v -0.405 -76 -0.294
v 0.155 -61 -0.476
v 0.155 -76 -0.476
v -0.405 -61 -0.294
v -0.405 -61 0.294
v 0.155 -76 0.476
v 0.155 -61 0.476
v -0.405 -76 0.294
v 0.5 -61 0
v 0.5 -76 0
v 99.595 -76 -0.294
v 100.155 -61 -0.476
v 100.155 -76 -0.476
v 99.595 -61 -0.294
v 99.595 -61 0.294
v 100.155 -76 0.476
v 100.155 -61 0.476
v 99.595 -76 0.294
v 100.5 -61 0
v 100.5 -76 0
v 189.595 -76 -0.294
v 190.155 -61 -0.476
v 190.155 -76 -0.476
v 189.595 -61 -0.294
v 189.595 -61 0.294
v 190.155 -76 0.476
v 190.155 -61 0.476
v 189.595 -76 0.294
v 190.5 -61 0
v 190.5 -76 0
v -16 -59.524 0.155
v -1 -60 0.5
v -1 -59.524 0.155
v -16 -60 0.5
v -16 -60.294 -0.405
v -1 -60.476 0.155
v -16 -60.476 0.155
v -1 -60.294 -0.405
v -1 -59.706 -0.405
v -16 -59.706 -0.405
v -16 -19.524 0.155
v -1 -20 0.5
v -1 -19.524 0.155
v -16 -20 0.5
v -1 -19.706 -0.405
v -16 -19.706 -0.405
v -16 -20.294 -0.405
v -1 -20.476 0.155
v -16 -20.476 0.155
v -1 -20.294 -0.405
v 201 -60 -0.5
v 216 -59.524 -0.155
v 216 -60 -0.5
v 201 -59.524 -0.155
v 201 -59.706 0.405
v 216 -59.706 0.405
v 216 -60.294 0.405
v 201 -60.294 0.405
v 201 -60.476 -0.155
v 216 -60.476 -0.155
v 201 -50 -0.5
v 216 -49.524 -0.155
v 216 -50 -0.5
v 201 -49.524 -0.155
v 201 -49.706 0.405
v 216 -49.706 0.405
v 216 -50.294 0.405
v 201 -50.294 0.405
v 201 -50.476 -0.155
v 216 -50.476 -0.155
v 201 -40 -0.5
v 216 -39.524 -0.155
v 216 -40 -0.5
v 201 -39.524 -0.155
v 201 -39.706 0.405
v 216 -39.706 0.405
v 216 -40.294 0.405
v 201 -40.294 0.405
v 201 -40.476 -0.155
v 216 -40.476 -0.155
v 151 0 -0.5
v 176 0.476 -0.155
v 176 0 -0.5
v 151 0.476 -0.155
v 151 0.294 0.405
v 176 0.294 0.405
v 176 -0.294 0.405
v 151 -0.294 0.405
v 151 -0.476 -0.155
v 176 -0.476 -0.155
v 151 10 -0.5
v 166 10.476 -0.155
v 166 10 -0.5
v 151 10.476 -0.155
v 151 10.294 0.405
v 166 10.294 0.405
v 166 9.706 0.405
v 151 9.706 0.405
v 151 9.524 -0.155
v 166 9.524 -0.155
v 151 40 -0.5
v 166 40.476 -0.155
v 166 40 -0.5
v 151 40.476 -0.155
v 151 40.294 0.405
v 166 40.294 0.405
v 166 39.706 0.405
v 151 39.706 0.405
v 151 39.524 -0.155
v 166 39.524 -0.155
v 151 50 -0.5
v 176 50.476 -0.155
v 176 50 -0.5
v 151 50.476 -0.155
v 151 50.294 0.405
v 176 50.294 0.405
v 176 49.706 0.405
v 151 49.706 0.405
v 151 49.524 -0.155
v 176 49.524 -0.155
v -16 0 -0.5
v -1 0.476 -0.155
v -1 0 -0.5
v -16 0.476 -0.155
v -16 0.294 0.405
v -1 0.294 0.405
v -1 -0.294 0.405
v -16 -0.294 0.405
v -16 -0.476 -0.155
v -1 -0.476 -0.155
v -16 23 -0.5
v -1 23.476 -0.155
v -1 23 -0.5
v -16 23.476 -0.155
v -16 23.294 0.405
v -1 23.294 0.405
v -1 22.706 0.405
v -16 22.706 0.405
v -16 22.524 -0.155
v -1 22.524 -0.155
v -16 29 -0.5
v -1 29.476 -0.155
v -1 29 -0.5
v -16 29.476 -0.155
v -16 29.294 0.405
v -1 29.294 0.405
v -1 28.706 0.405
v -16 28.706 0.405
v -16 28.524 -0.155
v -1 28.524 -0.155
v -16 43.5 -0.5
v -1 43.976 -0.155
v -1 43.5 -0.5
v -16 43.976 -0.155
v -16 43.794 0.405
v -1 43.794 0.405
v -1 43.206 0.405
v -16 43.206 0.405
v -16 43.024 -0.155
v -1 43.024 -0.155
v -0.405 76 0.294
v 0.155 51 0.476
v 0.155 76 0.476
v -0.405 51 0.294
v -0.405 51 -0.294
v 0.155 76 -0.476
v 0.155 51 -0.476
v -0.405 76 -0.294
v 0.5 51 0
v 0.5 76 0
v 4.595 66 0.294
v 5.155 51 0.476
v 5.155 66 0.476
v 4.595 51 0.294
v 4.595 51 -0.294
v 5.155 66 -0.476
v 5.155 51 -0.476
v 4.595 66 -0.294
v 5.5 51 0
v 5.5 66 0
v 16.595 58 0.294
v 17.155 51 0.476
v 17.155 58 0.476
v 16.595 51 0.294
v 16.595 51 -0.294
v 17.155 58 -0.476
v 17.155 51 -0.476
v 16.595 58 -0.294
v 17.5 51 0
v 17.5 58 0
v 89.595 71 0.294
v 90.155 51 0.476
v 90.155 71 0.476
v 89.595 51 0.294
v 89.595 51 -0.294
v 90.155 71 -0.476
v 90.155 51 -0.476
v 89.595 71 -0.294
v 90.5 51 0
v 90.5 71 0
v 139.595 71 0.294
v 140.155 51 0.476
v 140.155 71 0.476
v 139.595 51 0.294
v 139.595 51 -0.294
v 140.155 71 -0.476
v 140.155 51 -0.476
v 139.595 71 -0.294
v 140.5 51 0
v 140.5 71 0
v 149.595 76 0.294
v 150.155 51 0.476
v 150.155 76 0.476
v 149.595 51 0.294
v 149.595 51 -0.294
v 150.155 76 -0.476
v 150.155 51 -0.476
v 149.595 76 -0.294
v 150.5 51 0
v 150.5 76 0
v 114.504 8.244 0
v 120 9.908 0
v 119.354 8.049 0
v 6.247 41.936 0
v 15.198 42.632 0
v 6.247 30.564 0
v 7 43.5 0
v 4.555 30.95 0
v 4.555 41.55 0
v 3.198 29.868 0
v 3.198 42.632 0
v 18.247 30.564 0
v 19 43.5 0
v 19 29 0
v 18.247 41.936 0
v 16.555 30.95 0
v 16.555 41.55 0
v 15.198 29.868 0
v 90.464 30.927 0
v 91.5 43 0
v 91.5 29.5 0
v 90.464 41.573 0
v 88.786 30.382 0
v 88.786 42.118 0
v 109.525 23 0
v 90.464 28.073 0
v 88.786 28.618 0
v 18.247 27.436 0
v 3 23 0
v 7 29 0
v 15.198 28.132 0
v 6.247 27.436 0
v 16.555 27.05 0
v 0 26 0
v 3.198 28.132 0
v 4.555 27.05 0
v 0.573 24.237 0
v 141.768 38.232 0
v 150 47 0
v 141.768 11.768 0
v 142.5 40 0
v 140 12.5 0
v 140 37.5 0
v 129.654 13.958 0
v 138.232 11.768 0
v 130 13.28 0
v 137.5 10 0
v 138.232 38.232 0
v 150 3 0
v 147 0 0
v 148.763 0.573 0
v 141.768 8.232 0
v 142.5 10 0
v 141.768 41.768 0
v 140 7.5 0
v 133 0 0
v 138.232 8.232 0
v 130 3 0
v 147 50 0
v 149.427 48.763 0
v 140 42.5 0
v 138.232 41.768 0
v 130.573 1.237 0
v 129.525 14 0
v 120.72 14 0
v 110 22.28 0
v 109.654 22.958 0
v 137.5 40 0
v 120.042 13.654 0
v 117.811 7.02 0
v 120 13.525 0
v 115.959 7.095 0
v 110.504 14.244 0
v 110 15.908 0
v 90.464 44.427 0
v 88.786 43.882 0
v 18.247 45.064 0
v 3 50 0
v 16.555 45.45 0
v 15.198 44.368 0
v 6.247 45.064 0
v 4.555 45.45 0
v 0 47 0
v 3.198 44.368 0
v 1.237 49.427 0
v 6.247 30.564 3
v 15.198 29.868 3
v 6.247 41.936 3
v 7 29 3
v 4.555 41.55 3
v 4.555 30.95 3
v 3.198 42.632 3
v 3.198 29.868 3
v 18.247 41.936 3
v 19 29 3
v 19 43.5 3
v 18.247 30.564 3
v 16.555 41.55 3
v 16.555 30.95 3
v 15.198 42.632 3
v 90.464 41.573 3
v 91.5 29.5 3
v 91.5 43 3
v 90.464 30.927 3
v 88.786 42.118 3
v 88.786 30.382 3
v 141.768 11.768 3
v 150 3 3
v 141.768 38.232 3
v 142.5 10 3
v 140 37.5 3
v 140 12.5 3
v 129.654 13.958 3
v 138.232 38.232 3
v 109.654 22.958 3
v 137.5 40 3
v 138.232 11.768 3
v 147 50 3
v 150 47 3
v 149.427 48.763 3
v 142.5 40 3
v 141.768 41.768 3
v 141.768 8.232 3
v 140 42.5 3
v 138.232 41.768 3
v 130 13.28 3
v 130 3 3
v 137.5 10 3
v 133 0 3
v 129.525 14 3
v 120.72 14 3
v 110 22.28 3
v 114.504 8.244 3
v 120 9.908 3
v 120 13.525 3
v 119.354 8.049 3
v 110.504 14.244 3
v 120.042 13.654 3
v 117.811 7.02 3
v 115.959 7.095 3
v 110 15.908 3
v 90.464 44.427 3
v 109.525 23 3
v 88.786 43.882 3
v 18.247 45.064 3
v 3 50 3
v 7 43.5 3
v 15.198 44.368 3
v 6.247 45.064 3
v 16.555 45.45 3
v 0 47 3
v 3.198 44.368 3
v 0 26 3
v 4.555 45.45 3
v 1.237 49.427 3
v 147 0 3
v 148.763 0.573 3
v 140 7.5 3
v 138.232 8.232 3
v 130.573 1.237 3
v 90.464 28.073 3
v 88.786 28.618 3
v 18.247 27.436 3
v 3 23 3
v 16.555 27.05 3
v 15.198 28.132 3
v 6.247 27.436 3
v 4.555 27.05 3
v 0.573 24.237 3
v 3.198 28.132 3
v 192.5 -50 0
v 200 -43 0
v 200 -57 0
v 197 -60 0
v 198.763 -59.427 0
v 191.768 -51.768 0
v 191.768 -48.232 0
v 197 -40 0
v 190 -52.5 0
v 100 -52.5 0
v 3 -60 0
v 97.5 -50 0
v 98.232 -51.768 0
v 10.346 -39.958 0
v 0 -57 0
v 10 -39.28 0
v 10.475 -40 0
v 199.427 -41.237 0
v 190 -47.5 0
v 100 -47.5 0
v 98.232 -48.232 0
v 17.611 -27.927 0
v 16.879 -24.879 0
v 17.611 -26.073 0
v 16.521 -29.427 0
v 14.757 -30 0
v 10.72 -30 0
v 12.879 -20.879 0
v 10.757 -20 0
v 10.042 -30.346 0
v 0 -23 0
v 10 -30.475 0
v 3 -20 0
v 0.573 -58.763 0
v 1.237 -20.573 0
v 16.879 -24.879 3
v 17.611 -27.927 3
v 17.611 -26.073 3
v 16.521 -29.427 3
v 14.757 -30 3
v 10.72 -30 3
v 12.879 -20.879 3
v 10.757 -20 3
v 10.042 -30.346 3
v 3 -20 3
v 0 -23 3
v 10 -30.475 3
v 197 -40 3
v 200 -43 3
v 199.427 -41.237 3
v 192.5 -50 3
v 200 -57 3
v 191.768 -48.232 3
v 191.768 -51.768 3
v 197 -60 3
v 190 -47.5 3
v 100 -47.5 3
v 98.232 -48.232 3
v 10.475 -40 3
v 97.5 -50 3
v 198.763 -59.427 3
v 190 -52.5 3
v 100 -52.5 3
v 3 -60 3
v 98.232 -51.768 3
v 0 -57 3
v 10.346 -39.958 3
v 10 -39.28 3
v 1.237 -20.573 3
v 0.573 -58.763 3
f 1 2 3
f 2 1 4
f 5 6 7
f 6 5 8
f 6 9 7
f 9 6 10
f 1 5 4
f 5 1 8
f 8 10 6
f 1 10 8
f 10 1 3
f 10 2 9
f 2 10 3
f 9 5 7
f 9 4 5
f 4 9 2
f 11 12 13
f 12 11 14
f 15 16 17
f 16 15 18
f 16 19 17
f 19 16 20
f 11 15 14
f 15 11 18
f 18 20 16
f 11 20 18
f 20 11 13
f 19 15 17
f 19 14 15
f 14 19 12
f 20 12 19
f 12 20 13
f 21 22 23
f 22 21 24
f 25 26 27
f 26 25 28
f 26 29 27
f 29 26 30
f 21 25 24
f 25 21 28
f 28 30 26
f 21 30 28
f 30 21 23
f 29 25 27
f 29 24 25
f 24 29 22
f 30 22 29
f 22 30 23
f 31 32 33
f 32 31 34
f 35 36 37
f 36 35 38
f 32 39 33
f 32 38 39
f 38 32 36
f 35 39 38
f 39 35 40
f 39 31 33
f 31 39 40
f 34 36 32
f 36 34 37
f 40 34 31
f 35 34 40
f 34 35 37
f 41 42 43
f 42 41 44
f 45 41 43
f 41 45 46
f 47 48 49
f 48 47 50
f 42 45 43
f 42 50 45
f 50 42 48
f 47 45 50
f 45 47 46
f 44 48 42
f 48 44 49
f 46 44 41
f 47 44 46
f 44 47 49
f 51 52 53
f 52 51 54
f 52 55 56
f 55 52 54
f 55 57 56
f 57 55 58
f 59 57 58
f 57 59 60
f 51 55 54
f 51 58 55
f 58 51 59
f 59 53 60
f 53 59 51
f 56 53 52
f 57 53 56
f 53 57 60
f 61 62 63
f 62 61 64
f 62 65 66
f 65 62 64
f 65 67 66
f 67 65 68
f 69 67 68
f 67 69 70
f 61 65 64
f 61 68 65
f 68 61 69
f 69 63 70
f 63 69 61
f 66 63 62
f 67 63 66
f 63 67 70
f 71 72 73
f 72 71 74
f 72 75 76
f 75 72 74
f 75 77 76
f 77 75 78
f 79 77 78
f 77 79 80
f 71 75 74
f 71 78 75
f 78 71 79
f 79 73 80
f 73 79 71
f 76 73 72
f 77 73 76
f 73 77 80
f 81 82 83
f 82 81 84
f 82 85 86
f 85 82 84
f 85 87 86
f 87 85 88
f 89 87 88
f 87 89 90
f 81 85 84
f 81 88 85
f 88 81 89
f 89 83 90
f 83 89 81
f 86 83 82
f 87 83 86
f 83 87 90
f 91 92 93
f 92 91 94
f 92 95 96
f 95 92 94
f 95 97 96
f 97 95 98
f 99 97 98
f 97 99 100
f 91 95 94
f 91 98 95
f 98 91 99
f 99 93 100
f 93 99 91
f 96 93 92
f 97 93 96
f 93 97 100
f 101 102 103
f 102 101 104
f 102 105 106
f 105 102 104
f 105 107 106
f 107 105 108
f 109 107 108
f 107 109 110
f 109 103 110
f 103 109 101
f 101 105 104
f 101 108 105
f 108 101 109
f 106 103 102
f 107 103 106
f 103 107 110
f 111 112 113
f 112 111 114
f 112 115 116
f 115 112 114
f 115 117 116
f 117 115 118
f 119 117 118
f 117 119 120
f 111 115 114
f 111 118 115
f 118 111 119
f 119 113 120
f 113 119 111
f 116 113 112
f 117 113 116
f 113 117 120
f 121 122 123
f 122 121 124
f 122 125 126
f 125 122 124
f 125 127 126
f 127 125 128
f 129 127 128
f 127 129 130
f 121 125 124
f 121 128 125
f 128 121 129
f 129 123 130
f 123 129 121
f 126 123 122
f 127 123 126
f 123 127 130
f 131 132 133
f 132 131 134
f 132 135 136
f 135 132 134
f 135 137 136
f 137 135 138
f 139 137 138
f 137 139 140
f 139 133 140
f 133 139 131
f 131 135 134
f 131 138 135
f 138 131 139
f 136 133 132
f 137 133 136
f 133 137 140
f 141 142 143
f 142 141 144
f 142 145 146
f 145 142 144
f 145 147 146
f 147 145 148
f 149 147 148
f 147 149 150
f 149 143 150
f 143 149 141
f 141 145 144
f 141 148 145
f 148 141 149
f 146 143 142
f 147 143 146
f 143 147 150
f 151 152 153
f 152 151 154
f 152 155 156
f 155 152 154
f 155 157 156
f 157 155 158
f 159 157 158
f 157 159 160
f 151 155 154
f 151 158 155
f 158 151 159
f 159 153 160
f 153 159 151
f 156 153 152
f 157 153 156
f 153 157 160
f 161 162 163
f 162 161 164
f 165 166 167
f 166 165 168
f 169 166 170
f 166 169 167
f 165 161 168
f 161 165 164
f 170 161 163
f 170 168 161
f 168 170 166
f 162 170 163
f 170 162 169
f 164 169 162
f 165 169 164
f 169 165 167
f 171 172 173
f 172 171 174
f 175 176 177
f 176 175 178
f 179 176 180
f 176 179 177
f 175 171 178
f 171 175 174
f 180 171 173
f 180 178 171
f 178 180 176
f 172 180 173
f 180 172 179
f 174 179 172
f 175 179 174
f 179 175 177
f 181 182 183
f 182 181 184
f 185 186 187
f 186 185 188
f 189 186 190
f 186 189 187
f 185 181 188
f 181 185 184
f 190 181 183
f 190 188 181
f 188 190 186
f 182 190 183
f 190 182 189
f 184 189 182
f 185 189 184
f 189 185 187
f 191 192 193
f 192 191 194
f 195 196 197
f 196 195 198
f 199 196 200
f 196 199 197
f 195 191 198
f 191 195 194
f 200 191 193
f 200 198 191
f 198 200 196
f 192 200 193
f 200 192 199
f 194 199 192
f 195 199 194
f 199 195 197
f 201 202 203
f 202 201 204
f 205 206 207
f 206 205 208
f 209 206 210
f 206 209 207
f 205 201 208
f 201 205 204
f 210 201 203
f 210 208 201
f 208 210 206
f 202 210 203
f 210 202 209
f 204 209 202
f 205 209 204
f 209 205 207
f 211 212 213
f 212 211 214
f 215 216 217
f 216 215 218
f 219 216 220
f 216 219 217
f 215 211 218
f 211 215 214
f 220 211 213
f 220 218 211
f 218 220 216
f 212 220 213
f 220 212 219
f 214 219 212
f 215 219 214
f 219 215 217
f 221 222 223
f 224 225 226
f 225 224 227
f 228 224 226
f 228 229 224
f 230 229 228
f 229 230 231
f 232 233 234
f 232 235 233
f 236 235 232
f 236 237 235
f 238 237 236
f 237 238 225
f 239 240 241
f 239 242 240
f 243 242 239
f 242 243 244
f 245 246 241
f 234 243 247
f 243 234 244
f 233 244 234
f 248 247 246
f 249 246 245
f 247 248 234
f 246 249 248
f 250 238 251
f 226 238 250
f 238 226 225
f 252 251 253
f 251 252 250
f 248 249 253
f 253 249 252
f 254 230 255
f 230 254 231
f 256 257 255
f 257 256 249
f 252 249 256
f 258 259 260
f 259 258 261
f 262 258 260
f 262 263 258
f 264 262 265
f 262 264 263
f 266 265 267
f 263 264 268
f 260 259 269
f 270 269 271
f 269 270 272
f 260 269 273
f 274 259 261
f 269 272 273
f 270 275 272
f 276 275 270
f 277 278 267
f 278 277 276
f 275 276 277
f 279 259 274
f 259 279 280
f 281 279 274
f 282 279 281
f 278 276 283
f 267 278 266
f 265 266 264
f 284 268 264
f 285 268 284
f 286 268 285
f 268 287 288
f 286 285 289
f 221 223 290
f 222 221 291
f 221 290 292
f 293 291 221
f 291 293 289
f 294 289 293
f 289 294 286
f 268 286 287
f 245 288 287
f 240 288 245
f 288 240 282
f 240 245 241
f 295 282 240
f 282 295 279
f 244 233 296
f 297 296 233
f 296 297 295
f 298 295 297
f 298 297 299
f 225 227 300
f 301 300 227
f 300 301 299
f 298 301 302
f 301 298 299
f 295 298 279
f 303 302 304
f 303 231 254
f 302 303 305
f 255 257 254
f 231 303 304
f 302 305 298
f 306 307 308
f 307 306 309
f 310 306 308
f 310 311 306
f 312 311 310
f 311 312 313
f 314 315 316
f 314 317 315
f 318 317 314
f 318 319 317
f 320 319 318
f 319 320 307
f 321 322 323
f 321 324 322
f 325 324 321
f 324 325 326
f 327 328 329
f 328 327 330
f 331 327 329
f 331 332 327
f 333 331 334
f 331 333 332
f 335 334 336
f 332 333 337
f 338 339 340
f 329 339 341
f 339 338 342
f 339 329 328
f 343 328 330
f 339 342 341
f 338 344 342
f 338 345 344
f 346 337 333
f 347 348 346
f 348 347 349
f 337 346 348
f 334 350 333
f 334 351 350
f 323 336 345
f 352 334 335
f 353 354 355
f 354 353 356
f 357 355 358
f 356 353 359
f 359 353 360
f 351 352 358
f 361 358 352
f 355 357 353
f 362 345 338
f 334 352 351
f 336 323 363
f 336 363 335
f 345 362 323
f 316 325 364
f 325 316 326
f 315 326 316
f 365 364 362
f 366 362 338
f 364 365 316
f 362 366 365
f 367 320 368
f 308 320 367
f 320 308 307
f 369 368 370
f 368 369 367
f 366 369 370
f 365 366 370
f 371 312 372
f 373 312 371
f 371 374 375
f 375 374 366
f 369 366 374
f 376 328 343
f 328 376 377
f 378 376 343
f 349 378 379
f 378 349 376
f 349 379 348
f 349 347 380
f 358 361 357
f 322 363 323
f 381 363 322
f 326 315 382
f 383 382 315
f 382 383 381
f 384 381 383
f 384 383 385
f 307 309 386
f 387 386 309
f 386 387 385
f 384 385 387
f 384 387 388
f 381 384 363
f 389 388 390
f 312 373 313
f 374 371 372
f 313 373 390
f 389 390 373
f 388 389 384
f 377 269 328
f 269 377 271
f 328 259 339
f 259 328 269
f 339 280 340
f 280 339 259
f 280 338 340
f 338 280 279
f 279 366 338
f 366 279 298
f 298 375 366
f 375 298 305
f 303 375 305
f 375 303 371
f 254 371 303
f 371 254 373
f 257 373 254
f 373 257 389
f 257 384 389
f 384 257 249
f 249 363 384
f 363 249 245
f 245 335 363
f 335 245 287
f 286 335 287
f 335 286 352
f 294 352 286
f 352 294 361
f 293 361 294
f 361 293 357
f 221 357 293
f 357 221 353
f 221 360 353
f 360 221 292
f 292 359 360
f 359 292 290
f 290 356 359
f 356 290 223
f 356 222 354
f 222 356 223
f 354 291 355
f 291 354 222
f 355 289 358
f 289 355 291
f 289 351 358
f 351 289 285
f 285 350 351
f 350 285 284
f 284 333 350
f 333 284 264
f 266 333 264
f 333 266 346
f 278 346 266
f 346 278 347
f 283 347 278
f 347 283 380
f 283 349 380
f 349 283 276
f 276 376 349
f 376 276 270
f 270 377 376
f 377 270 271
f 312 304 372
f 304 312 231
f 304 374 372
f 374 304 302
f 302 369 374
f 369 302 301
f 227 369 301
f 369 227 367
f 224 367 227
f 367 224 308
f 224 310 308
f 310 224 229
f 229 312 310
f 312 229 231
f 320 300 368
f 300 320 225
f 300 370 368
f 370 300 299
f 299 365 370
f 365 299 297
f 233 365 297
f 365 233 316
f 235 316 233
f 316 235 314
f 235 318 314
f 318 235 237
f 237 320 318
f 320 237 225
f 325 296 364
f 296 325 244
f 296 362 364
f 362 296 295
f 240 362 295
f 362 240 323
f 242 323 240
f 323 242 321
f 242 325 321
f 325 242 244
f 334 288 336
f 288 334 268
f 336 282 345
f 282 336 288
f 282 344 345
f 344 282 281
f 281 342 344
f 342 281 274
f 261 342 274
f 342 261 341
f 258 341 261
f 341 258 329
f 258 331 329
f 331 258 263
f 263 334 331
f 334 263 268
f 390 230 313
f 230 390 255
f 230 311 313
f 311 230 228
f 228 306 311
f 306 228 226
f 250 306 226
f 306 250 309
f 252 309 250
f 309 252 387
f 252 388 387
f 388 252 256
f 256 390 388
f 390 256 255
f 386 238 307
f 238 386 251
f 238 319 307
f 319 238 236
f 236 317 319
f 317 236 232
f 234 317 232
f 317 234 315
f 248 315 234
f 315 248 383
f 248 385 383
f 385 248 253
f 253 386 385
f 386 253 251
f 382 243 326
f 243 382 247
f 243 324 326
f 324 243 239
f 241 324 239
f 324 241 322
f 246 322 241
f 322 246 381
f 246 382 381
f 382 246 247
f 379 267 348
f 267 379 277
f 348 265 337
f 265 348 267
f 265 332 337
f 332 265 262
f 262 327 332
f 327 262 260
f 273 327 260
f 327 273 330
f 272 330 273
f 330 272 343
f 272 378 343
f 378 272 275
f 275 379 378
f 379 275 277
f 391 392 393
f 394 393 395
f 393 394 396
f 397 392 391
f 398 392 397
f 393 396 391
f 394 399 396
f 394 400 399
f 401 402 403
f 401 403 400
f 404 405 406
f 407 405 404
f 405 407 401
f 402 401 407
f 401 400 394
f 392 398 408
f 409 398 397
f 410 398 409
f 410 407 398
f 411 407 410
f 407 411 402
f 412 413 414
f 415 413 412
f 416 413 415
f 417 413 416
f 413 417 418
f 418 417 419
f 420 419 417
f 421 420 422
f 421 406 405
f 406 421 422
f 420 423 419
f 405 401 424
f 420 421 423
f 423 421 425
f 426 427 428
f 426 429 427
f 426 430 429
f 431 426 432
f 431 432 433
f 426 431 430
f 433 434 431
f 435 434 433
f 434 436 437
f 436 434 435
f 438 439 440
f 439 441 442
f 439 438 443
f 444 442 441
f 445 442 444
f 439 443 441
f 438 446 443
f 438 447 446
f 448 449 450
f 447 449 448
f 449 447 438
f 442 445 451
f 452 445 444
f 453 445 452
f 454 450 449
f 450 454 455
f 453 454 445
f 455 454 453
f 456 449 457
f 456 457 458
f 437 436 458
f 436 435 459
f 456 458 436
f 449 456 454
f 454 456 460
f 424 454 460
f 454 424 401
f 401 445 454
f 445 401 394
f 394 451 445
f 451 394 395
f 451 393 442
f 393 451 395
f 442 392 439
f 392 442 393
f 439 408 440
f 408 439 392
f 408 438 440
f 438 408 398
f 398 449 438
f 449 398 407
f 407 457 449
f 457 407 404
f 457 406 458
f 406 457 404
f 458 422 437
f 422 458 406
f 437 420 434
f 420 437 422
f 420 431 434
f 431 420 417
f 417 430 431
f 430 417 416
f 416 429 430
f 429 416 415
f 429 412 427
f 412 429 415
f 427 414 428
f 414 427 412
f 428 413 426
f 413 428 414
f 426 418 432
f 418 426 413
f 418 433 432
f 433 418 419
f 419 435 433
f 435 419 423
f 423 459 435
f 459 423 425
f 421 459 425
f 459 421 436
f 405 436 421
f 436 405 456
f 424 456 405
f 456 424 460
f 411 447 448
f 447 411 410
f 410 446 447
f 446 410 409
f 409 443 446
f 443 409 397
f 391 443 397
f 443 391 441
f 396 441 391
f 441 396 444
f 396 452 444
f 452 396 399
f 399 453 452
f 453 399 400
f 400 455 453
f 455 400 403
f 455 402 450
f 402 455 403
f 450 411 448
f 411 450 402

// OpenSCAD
// file: beaters.scad
translate([0,21,0]) stickTip();
kickBeater();

module kickBeater() difference(){
    $fn=60;
    union(){
        cylinder(r=16,h=10);
        translate([0,0,10]) scale([1,1,0.33]) sphere(16);
    }
    translate([0,0,-1]) cylinder(r=1.5,h=5);
}

module stickTip() difference(){
    $fn=60;
    translate([0,0,3]) scale([2,1,1]) sphere(4);
    translate([0,0,-2]) cylinder(r=8,h=2);
    rotate([0,10,0]) translate([0,0,-2]) cylinder(r=1.5,h=6);
}
// file: solenoid.scad
solenoid();

module solenoid(pos=false,type="JF0826B",_echo=false){
    position = pos ? 1 : 0;
    if(type=="JF0826B"){
        location = 12 - position * 10;
        color("silver") 
        difference(){
            cube([22,25,27]);
            translate([-1,2,2]) cube([24,21,22]);
            translate([4,-1,26]) cube([14,27,2]);
            translate([-1,2,26]) cube([24,21,2]);
            translate([11,12.5,-1]) cylinder(r=2,h=4);
            translate([11,12.5,3]) cylinder(r=4,h=27);
            translate([5,12.5,20.5]) 
                    rotate([-90,0,0]) cylinder(r=1.5,h=15);
            translate([17,12.5,6]) 
                    rotate([-90,0,0]) cylinder(r=1.5,h=15);
        }
        color("blue") translate([11,12.5,2]) difference(){
            cylinder(r=11,h=22);
            translate([0,0,-1]) cylinder(r=4,h=29);
        }
        color("silver") translate([11,12.5,location]) difference(){
        union(){
                cylinder(r=3.75,h=35);
                translate([0,0,26]) cylinder(r=6,h=1);
                translate([0,0,-15]) cylinder(r=1.7,h=16);
                translate([0,0,-15]) cylinder(r=3,h=3);
                translate([0,0,-15]) sphere(3);
            }
            translate([-5,-1.2,28]) cube([10,2.4,10]);
            translate([0,5,31]) rotate([90,0,0]) cylinder(r=1.25,h=10);
        }
        if(_echo){
            echo("position",position);
            echo("type",type);
            echo("throw (mm)",10);
            echo("width (Xmm)",22);
            echo("depth (Ymm)",25);
            echo("height (Zmm)",27);
            echo("HOA (Zmm, nut to top of shaft)",55);
            echo("mount holes (Dmm)",3);
            echo("mount apacing (XxZmm)",
                 "12x12 at...\n\t5 from vertical edge,\n\t6 from bottom edge.");
        }
    }
}
// main file
use <solenoid.scad>
use <beaters.scad>

show = "parts";

module arm() color("silver") linear_extrude(height=3) difference(){
    offset(3) offset(-3){ /* arm profile from 150x50x3 aluminium */
        polygon([[0,50],[150,50],[150,0],[130,0],[130,14],
                 [120,14],[120,7],[118,3],[110,15],[110,23],[0,23]]);
        }
    //  solenoid mounting holes (can be mounted on either arm face)
    for(x=[5,17]) for(y=[29,43.5]) translate([x,y]) circle(2);
    //  mosfet board mounting holes (mount on same face as solenoid)
    for(y=[29.5,43]) translate([90,y]) circle(1.5);
    //  riser clamping bolt holes
    for(y=[10,40]) translate([140,y]) circle(2.5);
}

module riser() color("lightgray"){
    linear_extrude(height=3) difference(){
        offset(3) offset(-3){
            polygon([[0,0],[40,0],[40,200],[20,200],[20,10],
                     [10,10],[10,20],[8,20],[0,12]]);
        }
        hull() for(y=[100,190]) translate([30,y]) circle(2.5);
    }
}

if(show == "assembled"){
    translate([110,6,0]) rotate([90,0,0]) riser();
    translate([0,3,130]) rotate([90,0,0]) arm();
    translate([110,0,0]) rotate([90,0,0]) riser();
    translate([0,-25,153]) solenoid();
    translate([11,-12.5,151]) rotate([0,0,90]) mirror([0,0,1]) stickTip();
} else {
    arm();
    translate([0,-20,0]) rotate([0,0,-90]) riser();
    color("black"){
        translate([0,-61,0]) rotate([90,0,0]) cylinder(r=0.5,h=15);
        translate([100,-61,0]) rotate([90,0,0]) cylinder(r=0.5,h=15);
        translate([190,-61,0]) rotate([90,0,0]) cylinder(r=0.5,h=15);
        translate([-1,-60,0]) rotate([0,-90,0]) cylinder(r=0.5,h=15);
        translate([-1,-20,0]) rotate([0,-90,0]) cylinder(r=0.5,h=15);
        translate([201,-60,0]) rotate([0,90,0]) cylinder(r=0.5,h=15);
        translate([201,-50,0]) rotate([0,90,0]) cylinder(r=0.5,h=15);
        translate([201,-40,0]) rotate([0,90,0]) cylinder(r=0.5,h=15);
        translate([0,-70,0]) 
                text(text="<----------------------------- 100mm ---------------------------->",size=3);
        translate([100,-70,0]) 
                text(text="<-------------------------- 90mm ------------------------->",size=3);
        translate([-12,-20.3,0]) rotate([0,0,-90]) 
                text(text="<------------ 40mm --->",size=3);
        translate([14,-30.3,0]) 
                rotate([0,0,-90]) text(text="<10>",size=3);
        translate([-16,-38,0]) 
                text(text="10mm ->        <-",size=3);
        translate([-3.5,-28,0]) 
                text(text="->               <-18mm",size=3);
        translate([210,-40.3,0]) 
                rotate([0,0,-90]) text(text="<10>",size=3);
        translate([210,-50.3,0]) 
                rotate([0,0,-90]) text(text="<10>",size=3);
        translate([10.5,-4.7,0]) rotate([0,0,-90]) 
                text(text="10mm->        <-",size=3);
        translate([45,-23.5,0]) rotate([0,0,-90]) 
                text(text="20mm ->                 <-",size=3);
        translate([100,-23.7,0]) rotate([0,0,-90]) 
                text(text="10mm ->        <-",size=3);
        translate([188,-23.7,0]) rotate([0,0,-90]) 
                text(text="10mm ->        <-",size=3);
        
        translate([151,0,0]) rotate([0,90,0]) cylinder(r=0.5,h=25);
        translate([151,10,0]) rotate([0,90,0]) cylinder(r=0.5,h=15);
        translate([151,40,0]) rotate([0,90,0]) cylinder(r=0.5,h=15);
        translate([151,50,0]) rotate([0,90,0]) cylinder(r=0.5,h=25);
        translate([-16,0,0]) rotate([0,90,0]) cylinder(r=0.5,h=15);
        translate([-16,23,0]) rotate([0,90,0]) cylinder(r=0.5,h=15);
        translate([-16,29,0]) rotate([0,90,0]) cylinder(r=0.5,h=15);
        translate([-16,43.5,0]) rotate([0,90,0]) cylinder(r=0.5,h=15);
        translate([-12,23,0]) 
                rotate([0,0,-90]) text(text="<-  23mm ->",size=3);
        translate([-12,43.75,0]) 
                rotate([0,0,-90]) text(text="< 14.5 >",size=3);
        translate([116,7,0]) 
                rotate([0,0,-90]) text(text="<7>",size=3);
        translate([125,13.5,0]) 
                rotate([0,0,-90]) text(text="<-14 ->",size=3);
        translate([162.5,10,0]) 
                rotate([0,0,-90]) text(text="<10>",size=3);
        translate([162.5,40,0]) 
                rotate([0,0,-90]) text(text="<---- 30mm ---->",size=3);
        translate([162.5,50,0]) 
                rotate([0,0,-90]) text(text="<10>",size=3);
        translate([172.5,50,0]) rotate([0,0,-90]) 
                text(text="<----------- 50mm ----------->",size=3);
        
        translate([0,51,0]) rotate([-90,0,0]) cylinder(r=0.5,h=25);
        translate([5,51,0]) rotate([-90,0,0]) cylinder(r=0.5,h=15);
        translate([17,51,0]) rotate([-90,0,0]) cylinder(r=0.5,h=7);
        translate([90,51,0]) rotate([-90,0,0]) cylinder(r=0.5,h=20);
        translate([140,51,0]) rotate([-90,0,0]) cylinder(r=0.5,h=20);
        translate([150,51,0]) rotate([-90,0,0]) cylinder(r=0.5,h=25);
        translate([0,-5,0]) 
                text(text="<------------------------------------ 120mm ----------------------------------->",size=3);
        translate([0,18,0]) 
                text(text="<--------------------------------- 110mm -------------------------------->",size=3);
        translate([0,72.5,0]) 
                text(text="<----------------------------------------------- 150mm ---------------------------------------------->",size=3);
        translate([-2,60,0]) text(text=">    <- 5mm",size=3);
        translate([3,52.5,0]) text(text=">          <- 12mm",size=3);
        translate([0,68,0]) 
                text(text="<------------------------- 90mm -------------------------->",size=3);
        translate([140,68,0]) text(text="<10>",size=3);
        translate([120,-5,0]) text(text="<10> < 20mm >",size=3);
        
        translate([30,80,0]) text(text="Beater Arm",size=7);
        translate([30,-20,0]) text(text="Riser (2x)",size=7);
        translate([30,-84,0]) 
            text(text="Cut beater arm from 50mmx3mm aluminium flatbar",size=4);
        translate([30,-90,0]) 
            text(text="Cut risers from 40mmx3mm aluminium flatbar",size=4);
    }
}
